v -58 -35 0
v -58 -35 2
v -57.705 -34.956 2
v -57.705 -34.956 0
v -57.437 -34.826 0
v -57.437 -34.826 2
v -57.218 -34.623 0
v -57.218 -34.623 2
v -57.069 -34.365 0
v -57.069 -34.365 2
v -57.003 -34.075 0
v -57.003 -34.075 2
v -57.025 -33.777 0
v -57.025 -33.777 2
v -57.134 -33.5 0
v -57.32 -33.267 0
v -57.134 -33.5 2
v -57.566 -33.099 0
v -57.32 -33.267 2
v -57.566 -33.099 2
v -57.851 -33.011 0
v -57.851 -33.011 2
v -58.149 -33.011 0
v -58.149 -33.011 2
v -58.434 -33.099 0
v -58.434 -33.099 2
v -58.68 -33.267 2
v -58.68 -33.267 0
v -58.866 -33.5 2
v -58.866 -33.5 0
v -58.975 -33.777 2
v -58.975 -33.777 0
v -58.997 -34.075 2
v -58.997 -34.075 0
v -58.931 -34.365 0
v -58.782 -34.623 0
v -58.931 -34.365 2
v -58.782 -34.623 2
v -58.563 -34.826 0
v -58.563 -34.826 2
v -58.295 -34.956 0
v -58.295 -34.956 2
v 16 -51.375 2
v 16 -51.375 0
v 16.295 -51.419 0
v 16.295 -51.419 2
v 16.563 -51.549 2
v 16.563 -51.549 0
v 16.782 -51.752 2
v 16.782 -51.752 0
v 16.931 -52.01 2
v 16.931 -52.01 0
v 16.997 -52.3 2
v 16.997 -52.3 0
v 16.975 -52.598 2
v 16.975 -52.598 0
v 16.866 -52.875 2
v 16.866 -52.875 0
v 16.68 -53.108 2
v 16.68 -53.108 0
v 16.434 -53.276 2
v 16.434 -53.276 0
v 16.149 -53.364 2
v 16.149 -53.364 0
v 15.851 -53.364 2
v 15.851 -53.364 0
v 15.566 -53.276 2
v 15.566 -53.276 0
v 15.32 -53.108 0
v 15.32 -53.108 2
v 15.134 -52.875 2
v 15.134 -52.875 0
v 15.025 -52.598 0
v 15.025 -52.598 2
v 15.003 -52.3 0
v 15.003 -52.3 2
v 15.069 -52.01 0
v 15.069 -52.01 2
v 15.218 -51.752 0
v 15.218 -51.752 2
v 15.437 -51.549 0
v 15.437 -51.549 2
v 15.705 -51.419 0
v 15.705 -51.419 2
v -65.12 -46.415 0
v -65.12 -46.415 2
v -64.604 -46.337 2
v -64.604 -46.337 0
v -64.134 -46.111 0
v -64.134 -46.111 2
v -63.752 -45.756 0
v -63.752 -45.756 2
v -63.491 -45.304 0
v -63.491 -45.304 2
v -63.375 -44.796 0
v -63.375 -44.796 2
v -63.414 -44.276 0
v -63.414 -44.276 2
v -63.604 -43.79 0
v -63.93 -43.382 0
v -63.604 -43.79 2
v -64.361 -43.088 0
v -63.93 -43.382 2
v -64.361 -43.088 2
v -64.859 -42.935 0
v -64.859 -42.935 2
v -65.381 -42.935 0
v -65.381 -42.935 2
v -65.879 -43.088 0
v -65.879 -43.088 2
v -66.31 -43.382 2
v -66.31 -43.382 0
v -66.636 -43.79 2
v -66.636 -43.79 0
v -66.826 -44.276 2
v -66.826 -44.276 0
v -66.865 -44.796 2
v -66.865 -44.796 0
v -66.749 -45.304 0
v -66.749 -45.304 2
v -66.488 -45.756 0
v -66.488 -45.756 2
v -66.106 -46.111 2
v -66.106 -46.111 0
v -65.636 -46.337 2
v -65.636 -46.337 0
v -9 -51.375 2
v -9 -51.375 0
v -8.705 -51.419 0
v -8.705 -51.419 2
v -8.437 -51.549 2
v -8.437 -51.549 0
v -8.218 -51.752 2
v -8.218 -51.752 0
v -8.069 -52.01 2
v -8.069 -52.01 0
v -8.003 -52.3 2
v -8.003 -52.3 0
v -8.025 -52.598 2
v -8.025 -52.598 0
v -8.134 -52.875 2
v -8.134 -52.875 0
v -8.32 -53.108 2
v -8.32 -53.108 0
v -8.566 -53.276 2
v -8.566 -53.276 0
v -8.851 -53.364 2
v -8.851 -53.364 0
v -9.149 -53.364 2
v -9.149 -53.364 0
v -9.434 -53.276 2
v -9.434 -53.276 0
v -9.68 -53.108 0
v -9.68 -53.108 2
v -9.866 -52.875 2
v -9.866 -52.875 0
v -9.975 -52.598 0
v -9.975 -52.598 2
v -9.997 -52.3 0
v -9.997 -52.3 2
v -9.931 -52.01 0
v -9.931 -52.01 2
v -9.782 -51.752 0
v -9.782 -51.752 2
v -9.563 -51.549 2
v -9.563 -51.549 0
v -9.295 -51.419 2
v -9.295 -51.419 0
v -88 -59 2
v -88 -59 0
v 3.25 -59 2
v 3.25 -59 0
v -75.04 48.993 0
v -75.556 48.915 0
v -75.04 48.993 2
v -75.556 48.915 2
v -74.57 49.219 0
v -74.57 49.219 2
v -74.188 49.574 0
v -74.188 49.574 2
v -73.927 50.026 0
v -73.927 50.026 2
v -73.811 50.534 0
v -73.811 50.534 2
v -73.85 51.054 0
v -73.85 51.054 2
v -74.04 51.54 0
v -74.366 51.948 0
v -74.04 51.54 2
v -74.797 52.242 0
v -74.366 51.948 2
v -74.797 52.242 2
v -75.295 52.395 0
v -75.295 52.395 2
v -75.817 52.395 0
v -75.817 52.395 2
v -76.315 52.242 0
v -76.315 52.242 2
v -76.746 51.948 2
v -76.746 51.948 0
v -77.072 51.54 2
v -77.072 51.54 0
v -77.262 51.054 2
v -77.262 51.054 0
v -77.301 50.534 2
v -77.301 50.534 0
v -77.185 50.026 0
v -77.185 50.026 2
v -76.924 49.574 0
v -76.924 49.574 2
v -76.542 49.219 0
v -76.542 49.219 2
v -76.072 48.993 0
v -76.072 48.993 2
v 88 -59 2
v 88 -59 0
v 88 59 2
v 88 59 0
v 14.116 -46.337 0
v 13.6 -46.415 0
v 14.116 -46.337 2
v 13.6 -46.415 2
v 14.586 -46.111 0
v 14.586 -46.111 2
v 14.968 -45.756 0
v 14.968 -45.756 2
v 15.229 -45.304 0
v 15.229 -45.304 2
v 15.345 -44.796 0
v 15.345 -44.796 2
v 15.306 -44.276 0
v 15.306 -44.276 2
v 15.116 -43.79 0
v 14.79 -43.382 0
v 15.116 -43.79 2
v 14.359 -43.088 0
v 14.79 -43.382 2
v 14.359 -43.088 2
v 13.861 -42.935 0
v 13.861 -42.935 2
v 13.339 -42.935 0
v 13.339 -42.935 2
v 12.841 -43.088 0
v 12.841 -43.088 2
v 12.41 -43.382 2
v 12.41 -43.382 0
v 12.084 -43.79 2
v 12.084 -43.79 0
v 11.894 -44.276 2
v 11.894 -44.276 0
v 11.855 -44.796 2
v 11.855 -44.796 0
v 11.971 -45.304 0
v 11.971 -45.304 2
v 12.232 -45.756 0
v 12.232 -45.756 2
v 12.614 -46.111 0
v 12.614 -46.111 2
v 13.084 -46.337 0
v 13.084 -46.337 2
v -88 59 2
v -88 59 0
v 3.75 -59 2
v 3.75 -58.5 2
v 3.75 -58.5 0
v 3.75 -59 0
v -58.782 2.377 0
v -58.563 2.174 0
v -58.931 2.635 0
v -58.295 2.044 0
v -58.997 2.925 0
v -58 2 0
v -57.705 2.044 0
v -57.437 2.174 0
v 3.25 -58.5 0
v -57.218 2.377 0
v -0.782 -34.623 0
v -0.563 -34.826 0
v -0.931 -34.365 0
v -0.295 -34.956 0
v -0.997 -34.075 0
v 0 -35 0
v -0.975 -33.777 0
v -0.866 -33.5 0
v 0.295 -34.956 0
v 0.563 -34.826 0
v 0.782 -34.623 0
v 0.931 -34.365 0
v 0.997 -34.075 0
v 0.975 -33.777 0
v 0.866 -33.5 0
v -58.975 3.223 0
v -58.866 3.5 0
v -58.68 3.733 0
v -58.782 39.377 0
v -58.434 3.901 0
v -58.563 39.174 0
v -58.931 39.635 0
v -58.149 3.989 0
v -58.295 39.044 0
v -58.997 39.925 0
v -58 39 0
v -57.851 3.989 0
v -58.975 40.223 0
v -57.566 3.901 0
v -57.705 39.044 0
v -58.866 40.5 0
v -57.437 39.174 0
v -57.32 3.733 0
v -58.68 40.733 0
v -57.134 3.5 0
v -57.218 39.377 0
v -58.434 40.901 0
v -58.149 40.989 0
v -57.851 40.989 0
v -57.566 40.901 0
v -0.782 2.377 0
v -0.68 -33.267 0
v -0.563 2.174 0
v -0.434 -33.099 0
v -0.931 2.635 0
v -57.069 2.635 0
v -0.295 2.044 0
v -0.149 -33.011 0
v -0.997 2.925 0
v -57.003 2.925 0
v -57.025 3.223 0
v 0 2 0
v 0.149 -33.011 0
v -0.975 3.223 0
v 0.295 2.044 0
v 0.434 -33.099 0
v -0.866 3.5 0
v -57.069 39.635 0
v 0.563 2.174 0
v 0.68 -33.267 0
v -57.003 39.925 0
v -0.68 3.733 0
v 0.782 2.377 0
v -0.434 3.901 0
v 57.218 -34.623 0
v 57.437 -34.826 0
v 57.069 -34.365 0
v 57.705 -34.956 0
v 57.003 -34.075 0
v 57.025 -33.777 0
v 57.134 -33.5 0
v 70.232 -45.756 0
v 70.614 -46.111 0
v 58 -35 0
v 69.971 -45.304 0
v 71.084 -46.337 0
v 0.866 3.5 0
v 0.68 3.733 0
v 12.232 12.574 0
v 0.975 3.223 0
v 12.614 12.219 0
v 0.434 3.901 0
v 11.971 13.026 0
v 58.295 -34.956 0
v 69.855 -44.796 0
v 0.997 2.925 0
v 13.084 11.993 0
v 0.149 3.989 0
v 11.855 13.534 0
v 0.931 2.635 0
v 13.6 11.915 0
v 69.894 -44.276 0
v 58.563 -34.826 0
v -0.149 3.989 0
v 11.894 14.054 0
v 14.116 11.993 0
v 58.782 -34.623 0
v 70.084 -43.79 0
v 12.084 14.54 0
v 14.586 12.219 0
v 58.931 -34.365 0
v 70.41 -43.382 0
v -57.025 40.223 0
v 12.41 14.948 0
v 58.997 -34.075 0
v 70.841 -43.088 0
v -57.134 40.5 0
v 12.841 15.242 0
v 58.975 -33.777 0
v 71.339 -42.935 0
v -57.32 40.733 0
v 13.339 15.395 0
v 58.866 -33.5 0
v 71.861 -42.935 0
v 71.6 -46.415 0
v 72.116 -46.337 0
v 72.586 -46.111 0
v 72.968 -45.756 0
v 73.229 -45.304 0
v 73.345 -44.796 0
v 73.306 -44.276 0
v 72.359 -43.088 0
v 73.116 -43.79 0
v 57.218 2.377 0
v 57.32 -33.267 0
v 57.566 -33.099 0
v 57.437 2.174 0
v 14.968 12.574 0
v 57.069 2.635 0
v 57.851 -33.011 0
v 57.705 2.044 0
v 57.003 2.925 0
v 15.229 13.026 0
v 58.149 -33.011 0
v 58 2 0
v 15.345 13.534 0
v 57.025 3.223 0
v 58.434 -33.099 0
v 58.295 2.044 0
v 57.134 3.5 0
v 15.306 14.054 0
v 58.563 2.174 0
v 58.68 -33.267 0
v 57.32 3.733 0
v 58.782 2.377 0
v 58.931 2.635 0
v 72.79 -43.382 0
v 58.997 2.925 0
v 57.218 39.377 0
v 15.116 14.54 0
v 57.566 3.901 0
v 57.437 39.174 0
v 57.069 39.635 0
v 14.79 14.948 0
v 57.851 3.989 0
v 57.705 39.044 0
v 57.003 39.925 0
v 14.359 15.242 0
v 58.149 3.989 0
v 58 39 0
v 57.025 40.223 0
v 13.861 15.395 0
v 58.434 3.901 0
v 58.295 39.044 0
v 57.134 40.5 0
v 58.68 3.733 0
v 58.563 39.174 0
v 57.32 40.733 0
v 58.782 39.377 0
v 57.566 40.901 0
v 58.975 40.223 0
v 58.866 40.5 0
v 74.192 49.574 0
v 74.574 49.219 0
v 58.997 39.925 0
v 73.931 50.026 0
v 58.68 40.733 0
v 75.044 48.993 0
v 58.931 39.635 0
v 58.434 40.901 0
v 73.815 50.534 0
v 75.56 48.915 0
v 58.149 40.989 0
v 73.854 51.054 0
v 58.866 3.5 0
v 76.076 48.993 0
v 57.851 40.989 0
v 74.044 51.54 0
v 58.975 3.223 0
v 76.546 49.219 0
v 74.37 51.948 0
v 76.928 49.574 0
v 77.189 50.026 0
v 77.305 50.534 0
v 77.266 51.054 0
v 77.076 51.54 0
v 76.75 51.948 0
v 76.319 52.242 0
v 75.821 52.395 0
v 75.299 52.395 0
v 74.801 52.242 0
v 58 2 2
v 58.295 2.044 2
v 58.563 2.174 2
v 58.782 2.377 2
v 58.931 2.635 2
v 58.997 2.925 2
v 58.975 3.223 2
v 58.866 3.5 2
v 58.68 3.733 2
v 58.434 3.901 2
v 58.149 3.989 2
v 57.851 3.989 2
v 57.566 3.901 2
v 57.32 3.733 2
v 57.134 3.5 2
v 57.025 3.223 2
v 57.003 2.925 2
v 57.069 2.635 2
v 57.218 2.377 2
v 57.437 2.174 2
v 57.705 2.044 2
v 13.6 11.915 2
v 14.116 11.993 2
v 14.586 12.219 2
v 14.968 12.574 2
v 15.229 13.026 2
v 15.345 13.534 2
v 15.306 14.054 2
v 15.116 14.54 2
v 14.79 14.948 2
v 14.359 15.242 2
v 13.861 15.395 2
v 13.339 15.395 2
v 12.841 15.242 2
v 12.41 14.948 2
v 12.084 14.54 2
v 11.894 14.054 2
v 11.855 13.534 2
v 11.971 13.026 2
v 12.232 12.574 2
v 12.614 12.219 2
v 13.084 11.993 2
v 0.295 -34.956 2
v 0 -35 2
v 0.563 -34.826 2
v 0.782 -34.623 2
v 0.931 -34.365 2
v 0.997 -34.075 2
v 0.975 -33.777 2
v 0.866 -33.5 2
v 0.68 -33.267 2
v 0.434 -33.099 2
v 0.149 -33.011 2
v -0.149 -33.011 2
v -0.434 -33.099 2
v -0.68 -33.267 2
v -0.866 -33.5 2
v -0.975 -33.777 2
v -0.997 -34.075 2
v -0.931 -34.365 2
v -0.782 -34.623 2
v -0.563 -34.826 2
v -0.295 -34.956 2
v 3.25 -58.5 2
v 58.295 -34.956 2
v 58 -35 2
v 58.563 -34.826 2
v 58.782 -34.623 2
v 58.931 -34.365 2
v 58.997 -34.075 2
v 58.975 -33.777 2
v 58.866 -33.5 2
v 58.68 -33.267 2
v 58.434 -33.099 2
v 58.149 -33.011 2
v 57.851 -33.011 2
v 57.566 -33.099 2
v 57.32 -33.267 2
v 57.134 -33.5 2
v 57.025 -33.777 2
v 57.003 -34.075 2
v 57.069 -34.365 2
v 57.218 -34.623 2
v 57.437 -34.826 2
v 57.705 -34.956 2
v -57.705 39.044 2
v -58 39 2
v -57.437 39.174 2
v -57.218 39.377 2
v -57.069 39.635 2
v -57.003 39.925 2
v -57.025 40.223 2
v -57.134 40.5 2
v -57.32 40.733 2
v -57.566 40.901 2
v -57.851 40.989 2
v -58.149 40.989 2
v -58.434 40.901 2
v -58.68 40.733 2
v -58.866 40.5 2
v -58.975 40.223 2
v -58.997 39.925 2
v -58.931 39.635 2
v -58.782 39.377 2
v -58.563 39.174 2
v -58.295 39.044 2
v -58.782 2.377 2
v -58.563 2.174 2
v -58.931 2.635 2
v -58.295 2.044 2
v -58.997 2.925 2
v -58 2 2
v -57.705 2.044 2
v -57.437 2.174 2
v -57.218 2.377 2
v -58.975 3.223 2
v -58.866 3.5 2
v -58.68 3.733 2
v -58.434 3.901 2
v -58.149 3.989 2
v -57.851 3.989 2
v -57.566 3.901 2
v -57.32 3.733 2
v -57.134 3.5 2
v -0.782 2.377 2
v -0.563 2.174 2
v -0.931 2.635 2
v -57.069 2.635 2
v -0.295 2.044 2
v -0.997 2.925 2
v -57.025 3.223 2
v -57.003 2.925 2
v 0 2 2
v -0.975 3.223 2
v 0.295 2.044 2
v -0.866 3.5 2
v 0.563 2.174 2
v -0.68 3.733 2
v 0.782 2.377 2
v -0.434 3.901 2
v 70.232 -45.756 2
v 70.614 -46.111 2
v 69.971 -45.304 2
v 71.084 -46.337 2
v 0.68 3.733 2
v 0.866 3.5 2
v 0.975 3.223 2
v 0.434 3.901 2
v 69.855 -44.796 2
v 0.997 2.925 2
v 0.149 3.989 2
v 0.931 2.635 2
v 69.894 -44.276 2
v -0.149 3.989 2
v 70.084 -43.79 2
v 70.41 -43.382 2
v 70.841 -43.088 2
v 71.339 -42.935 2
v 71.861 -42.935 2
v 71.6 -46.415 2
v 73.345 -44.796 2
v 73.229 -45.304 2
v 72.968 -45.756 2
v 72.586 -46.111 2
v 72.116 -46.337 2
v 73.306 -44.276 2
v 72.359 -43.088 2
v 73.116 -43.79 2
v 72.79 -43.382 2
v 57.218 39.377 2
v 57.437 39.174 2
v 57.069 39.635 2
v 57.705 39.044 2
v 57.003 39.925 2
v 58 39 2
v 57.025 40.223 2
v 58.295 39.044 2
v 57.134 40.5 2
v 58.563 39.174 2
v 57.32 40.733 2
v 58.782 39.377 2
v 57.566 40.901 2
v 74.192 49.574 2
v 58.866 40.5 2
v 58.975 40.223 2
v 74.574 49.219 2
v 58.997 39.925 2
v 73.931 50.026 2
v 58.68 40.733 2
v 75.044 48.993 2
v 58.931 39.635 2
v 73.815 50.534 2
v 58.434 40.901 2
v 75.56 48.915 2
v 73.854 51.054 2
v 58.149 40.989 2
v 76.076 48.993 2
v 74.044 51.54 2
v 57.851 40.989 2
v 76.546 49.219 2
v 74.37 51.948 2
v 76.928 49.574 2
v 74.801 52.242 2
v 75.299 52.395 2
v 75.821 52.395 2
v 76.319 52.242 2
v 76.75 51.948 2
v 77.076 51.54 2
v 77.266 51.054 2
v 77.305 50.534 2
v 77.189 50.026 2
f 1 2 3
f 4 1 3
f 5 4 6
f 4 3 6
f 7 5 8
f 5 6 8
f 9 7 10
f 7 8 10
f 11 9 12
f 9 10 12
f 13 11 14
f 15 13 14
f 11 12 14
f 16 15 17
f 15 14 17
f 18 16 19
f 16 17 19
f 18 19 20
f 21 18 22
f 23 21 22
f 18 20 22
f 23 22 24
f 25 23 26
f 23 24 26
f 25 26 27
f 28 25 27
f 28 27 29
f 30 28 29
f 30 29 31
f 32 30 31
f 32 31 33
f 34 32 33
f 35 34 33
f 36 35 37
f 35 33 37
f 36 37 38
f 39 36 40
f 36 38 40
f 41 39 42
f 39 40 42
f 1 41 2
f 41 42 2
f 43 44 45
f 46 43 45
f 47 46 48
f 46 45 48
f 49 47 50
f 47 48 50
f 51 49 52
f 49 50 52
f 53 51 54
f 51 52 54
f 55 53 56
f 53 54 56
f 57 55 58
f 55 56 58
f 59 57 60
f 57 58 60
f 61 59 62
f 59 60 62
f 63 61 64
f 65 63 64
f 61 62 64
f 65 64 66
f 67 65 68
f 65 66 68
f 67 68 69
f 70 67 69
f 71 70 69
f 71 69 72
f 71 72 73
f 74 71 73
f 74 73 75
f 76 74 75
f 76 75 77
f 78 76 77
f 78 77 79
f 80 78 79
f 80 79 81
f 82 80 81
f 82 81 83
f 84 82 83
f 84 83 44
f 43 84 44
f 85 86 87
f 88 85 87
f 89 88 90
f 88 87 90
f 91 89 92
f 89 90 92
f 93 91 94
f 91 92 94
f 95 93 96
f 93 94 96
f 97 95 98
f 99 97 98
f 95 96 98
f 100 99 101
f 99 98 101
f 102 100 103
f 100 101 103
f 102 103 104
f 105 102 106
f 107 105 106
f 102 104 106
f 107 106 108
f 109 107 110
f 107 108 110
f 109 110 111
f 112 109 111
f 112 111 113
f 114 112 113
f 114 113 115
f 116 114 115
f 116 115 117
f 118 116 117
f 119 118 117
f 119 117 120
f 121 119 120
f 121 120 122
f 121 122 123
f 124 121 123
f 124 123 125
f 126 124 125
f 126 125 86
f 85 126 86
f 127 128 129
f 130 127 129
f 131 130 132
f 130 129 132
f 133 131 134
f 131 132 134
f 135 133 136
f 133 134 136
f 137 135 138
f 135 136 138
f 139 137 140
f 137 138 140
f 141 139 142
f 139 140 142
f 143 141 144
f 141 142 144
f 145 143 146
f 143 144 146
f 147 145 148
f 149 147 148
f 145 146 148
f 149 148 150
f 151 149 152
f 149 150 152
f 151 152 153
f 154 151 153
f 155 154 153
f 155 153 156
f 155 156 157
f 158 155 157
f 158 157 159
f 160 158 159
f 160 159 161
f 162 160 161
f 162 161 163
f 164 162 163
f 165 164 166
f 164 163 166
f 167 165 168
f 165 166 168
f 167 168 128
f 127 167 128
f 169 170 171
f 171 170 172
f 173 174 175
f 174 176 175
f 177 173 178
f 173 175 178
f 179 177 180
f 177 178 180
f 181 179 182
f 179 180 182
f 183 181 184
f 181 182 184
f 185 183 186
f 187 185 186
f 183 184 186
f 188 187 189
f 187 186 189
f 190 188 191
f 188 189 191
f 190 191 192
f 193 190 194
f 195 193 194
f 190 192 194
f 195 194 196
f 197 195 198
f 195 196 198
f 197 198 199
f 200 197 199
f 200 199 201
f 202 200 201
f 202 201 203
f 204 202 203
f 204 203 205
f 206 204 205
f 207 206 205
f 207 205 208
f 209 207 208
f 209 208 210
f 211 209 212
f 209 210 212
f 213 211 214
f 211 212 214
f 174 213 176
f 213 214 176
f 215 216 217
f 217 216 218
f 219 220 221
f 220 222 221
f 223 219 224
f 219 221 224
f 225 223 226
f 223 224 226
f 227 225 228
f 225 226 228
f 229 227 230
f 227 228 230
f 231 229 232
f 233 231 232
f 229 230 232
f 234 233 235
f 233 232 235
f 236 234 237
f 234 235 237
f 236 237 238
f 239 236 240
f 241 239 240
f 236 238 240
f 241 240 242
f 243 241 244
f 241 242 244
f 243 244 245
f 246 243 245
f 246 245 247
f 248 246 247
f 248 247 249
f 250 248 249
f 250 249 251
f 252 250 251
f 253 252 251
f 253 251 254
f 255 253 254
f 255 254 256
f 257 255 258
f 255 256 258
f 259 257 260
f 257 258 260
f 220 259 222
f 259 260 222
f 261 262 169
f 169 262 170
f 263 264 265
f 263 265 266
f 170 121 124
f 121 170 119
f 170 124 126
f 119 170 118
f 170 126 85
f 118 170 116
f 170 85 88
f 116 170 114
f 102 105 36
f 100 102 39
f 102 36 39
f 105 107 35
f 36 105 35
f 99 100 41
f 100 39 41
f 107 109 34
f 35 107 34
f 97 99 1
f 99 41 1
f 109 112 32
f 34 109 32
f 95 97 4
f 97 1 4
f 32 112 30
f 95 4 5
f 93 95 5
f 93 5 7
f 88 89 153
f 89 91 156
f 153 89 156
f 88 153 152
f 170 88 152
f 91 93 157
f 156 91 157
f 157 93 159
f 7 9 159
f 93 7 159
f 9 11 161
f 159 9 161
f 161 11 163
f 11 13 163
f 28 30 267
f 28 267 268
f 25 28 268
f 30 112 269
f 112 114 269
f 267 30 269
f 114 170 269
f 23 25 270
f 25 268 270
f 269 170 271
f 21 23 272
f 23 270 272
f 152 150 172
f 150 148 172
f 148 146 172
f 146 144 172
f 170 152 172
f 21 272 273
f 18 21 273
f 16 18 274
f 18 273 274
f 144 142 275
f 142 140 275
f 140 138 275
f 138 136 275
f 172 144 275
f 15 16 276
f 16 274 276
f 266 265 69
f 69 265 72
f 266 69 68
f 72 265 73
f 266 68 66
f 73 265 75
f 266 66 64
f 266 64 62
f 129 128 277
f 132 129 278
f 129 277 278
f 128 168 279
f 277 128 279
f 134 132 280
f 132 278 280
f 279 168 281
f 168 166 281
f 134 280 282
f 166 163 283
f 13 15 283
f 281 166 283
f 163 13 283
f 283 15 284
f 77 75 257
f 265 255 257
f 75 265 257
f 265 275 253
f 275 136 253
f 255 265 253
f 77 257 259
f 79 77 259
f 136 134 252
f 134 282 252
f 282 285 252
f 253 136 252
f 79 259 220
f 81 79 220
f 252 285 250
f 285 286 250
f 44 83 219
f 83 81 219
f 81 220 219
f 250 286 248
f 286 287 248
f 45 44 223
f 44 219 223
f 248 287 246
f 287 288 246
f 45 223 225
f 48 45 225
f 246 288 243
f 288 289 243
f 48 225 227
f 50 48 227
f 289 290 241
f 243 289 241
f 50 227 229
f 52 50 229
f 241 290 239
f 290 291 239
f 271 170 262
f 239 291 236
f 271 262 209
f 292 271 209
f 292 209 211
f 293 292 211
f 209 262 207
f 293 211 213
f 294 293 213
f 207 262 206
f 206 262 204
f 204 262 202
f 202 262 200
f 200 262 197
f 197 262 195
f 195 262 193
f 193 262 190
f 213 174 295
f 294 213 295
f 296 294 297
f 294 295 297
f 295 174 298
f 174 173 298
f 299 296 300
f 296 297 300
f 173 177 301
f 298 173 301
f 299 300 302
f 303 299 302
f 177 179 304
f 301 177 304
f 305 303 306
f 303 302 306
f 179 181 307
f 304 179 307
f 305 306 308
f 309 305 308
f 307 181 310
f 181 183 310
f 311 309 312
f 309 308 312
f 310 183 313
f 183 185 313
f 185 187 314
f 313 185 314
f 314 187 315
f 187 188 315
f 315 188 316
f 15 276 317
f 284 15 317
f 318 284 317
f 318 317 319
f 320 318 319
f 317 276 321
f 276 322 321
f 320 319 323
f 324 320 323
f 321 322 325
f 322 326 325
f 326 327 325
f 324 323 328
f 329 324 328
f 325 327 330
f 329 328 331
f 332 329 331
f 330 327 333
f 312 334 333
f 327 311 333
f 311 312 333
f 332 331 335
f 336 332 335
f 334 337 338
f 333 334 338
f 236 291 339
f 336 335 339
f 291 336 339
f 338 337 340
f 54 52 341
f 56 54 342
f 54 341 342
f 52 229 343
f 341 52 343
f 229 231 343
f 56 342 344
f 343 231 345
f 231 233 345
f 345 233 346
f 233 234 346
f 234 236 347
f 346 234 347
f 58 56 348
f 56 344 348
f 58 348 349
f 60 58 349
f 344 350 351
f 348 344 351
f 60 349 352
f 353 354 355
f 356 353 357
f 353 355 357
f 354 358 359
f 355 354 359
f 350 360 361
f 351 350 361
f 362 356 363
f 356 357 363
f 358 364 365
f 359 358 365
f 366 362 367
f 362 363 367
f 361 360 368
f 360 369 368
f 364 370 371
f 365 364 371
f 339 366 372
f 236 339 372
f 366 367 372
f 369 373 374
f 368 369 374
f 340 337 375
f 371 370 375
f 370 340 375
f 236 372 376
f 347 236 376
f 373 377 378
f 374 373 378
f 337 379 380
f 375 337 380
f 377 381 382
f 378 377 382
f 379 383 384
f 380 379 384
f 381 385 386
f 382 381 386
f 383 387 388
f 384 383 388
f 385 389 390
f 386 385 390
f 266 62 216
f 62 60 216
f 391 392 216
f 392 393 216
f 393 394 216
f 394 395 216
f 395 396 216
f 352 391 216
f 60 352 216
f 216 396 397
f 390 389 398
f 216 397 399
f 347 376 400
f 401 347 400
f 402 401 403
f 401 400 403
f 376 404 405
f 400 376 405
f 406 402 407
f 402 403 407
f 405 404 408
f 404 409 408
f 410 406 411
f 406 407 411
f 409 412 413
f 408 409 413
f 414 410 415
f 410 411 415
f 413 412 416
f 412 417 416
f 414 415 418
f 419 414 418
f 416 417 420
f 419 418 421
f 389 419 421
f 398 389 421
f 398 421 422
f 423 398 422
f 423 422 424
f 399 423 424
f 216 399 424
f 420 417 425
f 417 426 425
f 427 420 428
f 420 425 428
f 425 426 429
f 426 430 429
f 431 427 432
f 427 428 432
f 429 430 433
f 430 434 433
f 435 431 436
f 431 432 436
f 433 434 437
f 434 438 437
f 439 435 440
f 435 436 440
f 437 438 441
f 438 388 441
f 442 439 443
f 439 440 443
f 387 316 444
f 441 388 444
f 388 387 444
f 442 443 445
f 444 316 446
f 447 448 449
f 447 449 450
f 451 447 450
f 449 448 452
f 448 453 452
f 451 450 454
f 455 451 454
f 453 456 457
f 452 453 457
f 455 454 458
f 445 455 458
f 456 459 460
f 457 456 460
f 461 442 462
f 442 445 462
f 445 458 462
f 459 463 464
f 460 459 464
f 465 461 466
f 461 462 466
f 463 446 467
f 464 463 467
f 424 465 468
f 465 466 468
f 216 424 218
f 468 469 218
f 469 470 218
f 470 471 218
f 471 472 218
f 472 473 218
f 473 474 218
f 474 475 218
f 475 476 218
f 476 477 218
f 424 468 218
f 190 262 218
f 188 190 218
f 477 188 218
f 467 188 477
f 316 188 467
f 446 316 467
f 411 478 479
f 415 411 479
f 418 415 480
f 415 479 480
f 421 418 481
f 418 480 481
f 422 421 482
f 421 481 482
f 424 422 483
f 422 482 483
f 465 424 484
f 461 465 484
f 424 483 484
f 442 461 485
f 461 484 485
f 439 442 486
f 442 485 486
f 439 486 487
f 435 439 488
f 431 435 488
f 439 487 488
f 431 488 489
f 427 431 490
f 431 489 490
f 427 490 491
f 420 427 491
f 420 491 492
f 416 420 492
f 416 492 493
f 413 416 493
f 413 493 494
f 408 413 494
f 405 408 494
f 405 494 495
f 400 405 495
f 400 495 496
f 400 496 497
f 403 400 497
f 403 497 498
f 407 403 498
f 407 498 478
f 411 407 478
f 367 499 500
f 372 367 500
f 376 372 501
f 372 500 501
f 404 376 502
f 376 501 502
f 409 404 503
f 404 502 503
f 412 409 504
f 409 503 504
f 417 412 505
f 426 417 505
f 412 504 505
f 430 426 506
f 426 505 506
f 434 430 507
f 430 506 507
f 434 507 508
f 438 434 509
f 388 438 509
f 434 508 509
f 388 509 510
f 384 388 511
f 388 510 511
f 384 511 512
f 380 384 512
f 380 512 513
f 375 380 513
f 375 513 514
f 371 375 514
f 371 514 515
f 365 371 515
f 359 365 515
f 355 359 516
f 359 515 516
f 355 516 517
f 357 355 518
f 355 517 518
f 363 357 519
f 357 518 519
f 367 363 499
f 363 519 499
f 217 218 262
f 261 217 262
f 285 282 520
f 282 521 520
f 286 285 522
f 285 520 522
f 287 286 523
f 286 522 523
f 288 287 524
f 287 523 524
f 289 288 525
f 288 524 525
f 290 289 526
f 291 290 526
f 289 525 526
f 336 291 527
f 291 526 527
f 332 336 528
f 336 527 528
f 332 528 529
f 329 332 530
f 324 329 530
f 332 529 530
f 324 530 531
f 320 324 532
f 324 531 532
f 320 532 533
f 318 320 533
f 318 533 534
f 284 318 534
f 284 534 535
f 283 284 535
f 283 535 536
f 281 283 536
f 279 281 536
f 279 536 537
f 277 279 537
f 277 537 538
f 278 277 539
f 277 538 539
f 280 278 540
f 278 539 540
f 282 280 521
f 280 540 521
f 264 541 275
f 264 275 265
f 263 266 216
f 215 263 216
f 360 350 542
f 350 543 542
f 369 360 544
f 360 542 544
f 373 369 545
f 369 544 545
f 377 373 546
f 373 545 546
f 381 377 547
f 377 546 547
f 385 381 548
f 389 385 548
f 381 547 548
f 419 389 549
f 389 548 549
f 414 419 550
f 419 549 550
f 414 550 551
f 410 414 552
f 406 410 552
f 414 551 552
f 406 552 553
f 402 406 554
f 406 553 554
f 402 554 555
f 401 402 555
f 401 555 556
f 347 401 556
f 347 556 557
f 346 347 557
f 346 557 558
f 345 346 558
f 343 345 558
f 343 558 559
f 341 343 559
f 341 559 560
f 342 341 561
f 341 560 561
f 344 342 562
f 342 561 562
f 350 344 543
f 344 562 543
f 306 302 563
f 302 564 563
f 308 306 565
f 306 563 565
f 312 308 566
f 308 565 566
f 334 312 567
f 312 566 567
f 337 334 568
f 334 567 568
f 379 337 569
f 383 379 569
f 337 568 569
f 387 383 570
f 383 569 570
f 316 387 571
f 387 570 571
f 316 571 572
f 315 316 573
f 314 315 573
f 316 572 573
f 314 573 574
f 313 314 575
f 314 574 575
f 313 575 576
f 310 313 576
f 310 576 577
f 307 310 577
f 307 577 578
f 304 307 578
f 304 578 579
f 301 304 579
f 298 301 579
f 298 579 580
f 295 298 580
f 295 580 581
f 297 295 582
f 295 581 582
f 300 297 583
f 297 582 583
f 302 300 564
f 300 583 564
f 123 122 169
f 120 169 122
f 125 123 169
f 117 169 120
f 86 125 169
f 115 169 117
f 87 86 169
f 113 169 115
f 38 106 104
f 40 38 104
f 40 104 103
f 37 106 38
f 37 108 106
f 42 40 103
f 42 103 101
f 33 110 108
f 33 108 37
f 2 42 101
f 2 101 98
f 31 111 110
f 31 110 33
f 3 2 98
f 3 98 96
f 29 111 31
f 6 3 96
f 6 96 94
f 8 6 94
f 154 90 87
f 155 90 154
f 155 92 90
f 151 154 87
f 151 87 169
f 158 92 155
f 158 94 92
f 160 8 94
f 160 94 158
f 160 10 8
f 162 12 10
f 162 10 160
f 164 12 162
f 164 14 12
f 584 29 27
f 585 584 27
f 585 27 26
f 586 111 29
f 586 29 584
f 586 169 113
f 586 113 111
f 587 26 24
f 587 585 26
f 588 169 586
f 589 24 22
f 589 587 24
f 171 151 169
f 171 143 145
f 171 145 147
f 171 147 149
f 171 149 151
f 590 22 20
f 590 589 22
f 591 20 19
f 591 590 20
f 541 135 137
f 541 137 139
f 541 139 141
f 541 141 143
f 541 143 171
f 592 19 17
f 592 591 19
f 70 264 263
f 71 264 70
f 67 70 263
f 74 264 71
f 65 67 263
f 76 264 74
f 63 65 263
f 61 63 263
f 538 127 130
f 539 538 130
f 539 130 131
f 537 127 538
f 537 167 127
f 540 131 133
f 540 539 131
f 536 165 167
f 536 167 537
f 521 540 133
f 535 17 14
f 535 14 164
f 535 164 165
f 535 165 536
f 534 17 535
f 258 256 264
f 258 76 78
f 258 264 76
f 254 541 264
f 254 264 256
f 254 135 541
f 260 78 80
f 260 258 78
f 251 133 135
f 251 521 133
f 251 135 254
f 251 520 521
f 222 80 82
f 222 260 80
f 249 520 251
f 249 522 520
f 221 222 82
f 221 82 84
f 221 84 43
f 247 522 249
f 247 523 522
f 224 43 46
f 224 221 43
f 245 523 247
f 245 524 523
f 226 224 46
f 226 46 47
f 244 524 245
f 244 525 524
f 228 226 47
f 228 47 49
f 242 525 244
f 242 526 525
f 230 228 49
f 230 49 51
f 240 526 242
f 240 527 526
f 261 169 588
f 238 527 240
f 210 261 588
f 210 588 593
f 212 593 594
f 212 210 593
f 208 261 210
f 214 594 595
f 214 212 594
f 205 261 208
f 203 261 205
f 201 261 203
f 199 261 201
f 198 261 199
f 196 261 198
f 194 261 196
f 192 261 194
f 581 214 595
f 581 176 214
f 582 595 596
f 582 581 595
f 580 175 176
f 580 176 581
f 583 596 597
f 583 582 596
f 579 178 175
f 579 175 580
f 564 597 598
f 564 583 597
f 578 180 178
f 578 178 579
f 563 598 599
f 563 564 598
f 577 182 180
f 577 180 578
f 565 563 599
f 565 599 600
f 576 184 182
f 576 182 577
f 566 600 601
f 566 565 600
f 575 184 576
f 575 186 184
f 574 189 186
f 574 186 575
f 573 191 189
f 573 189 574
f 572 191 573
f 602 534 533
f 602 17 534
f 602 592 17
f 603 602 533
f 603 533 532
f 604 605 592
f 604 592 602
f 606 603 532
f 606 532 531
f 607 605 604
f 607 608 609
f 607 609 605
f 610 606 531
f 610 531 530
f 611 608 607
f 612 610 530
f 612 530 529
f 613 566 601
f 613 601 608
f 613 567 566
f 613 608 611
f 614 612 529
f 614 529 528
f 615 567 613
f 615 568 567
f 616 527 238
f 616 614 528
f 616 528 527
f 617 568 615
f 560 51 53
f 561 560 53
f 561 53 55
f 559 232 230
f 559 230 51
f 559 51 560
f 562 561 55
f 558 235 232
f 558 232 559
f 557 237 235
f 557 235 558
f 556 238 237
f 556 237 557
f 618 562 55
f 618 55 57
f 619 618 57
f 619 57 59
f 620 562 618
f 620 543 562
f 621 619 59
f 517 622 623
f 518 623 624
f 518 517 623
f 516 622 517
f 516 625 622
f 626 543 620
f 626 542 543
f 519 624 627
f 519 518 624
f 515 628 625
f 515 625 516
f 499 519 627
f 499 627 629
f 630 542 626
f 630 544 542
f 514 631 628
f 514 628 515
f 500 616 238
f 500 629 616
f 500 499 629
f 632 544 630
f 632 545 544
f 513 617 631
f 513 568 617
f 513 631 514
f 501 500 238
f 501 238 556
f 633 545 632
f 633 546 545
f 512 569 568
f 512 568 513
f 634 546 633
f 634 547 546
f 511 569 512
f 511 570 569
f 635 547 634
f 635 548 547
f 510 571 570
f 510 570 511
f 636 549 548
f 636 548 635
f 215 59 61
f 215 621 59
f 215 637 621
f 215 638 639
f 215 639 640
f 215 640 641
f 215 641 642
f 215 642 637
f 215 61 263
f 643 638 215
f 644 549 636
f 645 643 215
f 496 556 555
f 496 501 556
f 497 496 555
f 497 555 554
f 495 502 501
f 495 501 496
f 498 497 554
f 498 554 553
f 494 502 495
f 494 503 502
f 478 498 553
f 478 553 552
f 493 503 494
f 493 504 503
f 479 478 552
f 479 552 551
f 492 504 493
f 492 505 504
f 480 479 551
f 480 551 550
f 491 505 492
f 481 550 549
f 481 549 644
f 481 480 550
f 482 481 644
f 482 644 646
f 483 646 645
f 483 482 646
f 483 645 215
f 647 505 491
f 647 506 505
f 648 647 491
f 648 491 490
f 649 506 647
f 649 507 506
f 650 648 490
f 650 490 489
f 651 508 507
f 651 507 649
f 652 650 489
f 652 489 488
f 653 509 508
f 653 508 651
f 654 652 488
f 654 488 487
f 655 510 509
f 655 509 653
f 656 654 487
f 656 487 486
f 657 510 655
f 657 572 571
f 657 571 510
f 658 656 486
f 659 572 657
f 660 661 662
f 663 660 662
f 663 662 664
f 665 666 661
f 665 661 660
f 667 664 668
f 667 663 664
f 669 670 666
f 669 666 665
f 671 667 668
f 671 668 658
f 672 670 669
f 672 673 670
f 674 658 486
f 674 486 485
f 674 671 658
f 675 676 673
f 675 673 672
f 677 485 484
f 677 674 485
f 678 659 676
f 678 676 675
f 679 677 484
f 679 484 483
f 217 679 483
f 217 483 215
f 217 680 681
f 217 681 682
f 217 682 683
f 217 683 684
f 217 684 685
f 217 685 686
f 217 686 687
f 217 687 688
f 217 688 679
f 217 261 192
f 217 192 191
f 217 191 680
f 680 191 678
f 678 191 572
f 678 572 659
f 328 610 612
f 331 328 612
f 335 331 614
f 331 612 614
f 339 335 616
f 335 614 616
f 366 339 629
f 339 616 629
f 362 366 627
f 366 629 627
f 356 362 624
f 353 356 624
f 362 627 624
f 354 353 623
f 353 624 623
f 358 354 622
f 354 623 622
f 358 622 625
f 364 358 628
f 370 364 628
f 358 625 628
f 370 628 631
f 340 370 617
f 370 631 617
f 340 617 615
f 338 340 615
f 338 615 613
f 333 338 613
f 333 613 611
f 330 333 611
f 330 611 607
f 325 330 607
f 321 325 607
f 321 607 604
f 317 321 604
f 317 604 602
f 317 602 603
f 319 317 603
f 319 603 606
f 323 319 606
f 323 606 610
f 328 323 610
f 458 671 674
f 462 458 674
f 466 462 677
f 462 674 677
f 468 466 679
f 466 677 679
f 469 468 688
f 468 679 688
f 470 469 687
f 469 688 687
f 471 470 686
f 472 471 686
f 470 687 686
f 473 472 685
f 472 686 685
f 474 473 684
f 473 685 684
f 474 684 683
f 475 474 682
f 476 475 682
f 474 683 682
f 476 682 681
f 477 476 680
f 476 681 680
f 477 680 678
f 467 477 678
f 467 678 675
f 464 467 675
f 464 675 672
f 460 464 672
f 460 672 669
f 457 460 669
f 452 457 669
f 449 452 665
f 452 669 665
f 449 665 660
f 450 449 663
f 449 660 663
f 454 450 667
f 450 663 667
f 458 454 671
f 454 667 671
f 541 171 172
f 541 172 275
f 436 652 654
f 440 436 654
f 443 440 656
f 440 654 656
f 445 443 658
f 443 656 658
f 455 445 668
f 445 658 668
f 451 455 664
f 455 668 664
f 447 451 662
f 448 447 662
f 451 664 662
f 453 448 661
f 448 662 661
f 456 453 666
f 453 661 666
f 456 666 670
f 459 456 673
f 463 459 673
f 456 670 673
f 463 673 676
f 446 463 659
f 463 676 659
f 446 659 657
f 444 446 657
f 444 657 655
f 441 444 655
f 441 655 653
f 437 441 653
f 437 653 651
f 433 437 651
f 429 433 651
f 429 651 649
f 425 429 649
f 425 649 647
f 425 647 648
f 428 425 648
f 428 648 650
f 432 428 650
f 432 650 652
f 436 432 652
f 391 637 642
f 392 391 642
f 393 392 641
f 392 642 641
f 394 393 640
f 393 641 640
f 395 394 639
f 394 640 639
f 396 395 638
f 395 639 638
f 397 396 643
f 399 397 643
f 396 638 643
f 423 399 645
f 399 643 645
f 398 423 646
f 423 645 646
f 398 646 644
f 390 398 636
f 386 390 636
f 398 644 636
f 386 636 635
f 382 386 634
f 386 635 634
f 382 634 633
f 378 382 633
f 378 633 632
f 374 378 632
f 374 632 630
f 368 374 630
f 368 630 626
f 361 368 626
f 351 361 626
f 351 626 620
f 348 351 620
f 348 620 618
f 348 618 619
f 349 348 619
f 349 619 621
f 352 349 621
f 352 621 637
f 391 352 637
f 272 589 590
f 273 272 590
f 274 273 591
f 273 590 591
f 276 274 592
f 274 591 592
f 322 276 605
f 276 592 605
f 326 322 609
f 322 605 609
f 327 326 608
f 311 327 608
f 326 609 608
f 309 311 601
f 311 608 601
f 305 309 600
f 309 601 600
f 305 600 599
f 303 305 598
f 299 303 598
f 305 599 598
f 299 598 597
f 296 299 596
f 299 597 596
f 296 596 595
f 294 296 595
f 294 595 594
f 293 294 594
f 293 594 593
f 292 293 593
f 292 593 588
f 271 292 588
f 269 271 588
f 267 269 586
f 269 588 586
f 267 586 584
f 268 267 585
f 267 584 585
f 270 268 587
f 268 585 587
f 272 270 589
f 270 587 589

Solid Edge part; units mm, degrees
sketch "Sketch1" plane through (0, 0, 0) normal (0, 0, 1) x (1, 0, 0)
  line L0 (-88, -59) -> (88, -59)
  line L1 (88, -59) -> (88, 59)
  line L2 (88, 59) -> (-88, 59)
  line L3 (-88, 59) -> (-88, -59)
  dimension "D1" = 118
  dimension "D2" = 176
extrude "Protrusion1" add sketch "Sketch1" along normal blind 2
hole "Hole1" at (-9, -52.375, 0) direction (0, 0, 1) diameter 2 end up to next
hole "Hole2" at (16, -52.375, 0) direction (0, 0, 1) diameter 2 end up to next
hole "Hole3" at (0, 3, 2) direction (0, 0, -1) diameter 2 end through all
hole "Hole4" at (58, 3, 2) direction (0, 0, -1) diameter 2 end through all
hole "Hole5" at (58, -34, 2) direction (0, 0, -1) diameter 2 end through all
hole "Hole6" at (0, -34, 2) direction (0, 0, -1) diameter 2 end through all
hole "Hole7" at (-58, -34, 2) direction (0, 0, -1) diameter 2 end through all
hole "Hole8" at (-58, 3, 2) direction (0, 0, -1) diameter 2 end through all
hole "Hole9" at (-58, 40, 2) direction (0, 0, -1) diameter 2 end through all
hole "Hole10" at (58, 40, 2) direction (0, 0, -1) diameter 2 end through all
sketch "Sketch2" plane through (0, 0, 2) normal (0, 0, 1) x (1, 0, 0)
  line L0 (3.25, -59) -> (3.75, -59)
  line L1 (3.75, -58.5) -> (3.75, -59)
  line L2 (3.25, -58.5) -> (3.75, -58.5)
  line L3 (3.25, -59) -> (3.25, -58.5)
  dimension "D1" = 0.5
extrude "Cutout1" cut sketch "Sketch2" against normal through all
hole "Hole11" at (13.6, 13.665, 2) direction (0, 0, -1) diameter 3.5 end through all
hole "Hole12" at (-65.12, -44.665, 2) direction (0, 0, -1) diameter 3.5 end through all
hole "Hole13" at (13.6, -44.665, 2) direction (0, 0, -1) diameter 3.5 end through all
hole "Hole14" at (75.56, 50.665, 2) direction (0, 0, -1) diameter 3.5 end through all
hole "Hole15" at (71.6, -44.665, 2) direction (0, 0, -1) diameter 3.5 end through all
hole "Hole16" at (-75.556, 50.665, 2) direction (0, 0, -1) diameter 3.5 end through all
